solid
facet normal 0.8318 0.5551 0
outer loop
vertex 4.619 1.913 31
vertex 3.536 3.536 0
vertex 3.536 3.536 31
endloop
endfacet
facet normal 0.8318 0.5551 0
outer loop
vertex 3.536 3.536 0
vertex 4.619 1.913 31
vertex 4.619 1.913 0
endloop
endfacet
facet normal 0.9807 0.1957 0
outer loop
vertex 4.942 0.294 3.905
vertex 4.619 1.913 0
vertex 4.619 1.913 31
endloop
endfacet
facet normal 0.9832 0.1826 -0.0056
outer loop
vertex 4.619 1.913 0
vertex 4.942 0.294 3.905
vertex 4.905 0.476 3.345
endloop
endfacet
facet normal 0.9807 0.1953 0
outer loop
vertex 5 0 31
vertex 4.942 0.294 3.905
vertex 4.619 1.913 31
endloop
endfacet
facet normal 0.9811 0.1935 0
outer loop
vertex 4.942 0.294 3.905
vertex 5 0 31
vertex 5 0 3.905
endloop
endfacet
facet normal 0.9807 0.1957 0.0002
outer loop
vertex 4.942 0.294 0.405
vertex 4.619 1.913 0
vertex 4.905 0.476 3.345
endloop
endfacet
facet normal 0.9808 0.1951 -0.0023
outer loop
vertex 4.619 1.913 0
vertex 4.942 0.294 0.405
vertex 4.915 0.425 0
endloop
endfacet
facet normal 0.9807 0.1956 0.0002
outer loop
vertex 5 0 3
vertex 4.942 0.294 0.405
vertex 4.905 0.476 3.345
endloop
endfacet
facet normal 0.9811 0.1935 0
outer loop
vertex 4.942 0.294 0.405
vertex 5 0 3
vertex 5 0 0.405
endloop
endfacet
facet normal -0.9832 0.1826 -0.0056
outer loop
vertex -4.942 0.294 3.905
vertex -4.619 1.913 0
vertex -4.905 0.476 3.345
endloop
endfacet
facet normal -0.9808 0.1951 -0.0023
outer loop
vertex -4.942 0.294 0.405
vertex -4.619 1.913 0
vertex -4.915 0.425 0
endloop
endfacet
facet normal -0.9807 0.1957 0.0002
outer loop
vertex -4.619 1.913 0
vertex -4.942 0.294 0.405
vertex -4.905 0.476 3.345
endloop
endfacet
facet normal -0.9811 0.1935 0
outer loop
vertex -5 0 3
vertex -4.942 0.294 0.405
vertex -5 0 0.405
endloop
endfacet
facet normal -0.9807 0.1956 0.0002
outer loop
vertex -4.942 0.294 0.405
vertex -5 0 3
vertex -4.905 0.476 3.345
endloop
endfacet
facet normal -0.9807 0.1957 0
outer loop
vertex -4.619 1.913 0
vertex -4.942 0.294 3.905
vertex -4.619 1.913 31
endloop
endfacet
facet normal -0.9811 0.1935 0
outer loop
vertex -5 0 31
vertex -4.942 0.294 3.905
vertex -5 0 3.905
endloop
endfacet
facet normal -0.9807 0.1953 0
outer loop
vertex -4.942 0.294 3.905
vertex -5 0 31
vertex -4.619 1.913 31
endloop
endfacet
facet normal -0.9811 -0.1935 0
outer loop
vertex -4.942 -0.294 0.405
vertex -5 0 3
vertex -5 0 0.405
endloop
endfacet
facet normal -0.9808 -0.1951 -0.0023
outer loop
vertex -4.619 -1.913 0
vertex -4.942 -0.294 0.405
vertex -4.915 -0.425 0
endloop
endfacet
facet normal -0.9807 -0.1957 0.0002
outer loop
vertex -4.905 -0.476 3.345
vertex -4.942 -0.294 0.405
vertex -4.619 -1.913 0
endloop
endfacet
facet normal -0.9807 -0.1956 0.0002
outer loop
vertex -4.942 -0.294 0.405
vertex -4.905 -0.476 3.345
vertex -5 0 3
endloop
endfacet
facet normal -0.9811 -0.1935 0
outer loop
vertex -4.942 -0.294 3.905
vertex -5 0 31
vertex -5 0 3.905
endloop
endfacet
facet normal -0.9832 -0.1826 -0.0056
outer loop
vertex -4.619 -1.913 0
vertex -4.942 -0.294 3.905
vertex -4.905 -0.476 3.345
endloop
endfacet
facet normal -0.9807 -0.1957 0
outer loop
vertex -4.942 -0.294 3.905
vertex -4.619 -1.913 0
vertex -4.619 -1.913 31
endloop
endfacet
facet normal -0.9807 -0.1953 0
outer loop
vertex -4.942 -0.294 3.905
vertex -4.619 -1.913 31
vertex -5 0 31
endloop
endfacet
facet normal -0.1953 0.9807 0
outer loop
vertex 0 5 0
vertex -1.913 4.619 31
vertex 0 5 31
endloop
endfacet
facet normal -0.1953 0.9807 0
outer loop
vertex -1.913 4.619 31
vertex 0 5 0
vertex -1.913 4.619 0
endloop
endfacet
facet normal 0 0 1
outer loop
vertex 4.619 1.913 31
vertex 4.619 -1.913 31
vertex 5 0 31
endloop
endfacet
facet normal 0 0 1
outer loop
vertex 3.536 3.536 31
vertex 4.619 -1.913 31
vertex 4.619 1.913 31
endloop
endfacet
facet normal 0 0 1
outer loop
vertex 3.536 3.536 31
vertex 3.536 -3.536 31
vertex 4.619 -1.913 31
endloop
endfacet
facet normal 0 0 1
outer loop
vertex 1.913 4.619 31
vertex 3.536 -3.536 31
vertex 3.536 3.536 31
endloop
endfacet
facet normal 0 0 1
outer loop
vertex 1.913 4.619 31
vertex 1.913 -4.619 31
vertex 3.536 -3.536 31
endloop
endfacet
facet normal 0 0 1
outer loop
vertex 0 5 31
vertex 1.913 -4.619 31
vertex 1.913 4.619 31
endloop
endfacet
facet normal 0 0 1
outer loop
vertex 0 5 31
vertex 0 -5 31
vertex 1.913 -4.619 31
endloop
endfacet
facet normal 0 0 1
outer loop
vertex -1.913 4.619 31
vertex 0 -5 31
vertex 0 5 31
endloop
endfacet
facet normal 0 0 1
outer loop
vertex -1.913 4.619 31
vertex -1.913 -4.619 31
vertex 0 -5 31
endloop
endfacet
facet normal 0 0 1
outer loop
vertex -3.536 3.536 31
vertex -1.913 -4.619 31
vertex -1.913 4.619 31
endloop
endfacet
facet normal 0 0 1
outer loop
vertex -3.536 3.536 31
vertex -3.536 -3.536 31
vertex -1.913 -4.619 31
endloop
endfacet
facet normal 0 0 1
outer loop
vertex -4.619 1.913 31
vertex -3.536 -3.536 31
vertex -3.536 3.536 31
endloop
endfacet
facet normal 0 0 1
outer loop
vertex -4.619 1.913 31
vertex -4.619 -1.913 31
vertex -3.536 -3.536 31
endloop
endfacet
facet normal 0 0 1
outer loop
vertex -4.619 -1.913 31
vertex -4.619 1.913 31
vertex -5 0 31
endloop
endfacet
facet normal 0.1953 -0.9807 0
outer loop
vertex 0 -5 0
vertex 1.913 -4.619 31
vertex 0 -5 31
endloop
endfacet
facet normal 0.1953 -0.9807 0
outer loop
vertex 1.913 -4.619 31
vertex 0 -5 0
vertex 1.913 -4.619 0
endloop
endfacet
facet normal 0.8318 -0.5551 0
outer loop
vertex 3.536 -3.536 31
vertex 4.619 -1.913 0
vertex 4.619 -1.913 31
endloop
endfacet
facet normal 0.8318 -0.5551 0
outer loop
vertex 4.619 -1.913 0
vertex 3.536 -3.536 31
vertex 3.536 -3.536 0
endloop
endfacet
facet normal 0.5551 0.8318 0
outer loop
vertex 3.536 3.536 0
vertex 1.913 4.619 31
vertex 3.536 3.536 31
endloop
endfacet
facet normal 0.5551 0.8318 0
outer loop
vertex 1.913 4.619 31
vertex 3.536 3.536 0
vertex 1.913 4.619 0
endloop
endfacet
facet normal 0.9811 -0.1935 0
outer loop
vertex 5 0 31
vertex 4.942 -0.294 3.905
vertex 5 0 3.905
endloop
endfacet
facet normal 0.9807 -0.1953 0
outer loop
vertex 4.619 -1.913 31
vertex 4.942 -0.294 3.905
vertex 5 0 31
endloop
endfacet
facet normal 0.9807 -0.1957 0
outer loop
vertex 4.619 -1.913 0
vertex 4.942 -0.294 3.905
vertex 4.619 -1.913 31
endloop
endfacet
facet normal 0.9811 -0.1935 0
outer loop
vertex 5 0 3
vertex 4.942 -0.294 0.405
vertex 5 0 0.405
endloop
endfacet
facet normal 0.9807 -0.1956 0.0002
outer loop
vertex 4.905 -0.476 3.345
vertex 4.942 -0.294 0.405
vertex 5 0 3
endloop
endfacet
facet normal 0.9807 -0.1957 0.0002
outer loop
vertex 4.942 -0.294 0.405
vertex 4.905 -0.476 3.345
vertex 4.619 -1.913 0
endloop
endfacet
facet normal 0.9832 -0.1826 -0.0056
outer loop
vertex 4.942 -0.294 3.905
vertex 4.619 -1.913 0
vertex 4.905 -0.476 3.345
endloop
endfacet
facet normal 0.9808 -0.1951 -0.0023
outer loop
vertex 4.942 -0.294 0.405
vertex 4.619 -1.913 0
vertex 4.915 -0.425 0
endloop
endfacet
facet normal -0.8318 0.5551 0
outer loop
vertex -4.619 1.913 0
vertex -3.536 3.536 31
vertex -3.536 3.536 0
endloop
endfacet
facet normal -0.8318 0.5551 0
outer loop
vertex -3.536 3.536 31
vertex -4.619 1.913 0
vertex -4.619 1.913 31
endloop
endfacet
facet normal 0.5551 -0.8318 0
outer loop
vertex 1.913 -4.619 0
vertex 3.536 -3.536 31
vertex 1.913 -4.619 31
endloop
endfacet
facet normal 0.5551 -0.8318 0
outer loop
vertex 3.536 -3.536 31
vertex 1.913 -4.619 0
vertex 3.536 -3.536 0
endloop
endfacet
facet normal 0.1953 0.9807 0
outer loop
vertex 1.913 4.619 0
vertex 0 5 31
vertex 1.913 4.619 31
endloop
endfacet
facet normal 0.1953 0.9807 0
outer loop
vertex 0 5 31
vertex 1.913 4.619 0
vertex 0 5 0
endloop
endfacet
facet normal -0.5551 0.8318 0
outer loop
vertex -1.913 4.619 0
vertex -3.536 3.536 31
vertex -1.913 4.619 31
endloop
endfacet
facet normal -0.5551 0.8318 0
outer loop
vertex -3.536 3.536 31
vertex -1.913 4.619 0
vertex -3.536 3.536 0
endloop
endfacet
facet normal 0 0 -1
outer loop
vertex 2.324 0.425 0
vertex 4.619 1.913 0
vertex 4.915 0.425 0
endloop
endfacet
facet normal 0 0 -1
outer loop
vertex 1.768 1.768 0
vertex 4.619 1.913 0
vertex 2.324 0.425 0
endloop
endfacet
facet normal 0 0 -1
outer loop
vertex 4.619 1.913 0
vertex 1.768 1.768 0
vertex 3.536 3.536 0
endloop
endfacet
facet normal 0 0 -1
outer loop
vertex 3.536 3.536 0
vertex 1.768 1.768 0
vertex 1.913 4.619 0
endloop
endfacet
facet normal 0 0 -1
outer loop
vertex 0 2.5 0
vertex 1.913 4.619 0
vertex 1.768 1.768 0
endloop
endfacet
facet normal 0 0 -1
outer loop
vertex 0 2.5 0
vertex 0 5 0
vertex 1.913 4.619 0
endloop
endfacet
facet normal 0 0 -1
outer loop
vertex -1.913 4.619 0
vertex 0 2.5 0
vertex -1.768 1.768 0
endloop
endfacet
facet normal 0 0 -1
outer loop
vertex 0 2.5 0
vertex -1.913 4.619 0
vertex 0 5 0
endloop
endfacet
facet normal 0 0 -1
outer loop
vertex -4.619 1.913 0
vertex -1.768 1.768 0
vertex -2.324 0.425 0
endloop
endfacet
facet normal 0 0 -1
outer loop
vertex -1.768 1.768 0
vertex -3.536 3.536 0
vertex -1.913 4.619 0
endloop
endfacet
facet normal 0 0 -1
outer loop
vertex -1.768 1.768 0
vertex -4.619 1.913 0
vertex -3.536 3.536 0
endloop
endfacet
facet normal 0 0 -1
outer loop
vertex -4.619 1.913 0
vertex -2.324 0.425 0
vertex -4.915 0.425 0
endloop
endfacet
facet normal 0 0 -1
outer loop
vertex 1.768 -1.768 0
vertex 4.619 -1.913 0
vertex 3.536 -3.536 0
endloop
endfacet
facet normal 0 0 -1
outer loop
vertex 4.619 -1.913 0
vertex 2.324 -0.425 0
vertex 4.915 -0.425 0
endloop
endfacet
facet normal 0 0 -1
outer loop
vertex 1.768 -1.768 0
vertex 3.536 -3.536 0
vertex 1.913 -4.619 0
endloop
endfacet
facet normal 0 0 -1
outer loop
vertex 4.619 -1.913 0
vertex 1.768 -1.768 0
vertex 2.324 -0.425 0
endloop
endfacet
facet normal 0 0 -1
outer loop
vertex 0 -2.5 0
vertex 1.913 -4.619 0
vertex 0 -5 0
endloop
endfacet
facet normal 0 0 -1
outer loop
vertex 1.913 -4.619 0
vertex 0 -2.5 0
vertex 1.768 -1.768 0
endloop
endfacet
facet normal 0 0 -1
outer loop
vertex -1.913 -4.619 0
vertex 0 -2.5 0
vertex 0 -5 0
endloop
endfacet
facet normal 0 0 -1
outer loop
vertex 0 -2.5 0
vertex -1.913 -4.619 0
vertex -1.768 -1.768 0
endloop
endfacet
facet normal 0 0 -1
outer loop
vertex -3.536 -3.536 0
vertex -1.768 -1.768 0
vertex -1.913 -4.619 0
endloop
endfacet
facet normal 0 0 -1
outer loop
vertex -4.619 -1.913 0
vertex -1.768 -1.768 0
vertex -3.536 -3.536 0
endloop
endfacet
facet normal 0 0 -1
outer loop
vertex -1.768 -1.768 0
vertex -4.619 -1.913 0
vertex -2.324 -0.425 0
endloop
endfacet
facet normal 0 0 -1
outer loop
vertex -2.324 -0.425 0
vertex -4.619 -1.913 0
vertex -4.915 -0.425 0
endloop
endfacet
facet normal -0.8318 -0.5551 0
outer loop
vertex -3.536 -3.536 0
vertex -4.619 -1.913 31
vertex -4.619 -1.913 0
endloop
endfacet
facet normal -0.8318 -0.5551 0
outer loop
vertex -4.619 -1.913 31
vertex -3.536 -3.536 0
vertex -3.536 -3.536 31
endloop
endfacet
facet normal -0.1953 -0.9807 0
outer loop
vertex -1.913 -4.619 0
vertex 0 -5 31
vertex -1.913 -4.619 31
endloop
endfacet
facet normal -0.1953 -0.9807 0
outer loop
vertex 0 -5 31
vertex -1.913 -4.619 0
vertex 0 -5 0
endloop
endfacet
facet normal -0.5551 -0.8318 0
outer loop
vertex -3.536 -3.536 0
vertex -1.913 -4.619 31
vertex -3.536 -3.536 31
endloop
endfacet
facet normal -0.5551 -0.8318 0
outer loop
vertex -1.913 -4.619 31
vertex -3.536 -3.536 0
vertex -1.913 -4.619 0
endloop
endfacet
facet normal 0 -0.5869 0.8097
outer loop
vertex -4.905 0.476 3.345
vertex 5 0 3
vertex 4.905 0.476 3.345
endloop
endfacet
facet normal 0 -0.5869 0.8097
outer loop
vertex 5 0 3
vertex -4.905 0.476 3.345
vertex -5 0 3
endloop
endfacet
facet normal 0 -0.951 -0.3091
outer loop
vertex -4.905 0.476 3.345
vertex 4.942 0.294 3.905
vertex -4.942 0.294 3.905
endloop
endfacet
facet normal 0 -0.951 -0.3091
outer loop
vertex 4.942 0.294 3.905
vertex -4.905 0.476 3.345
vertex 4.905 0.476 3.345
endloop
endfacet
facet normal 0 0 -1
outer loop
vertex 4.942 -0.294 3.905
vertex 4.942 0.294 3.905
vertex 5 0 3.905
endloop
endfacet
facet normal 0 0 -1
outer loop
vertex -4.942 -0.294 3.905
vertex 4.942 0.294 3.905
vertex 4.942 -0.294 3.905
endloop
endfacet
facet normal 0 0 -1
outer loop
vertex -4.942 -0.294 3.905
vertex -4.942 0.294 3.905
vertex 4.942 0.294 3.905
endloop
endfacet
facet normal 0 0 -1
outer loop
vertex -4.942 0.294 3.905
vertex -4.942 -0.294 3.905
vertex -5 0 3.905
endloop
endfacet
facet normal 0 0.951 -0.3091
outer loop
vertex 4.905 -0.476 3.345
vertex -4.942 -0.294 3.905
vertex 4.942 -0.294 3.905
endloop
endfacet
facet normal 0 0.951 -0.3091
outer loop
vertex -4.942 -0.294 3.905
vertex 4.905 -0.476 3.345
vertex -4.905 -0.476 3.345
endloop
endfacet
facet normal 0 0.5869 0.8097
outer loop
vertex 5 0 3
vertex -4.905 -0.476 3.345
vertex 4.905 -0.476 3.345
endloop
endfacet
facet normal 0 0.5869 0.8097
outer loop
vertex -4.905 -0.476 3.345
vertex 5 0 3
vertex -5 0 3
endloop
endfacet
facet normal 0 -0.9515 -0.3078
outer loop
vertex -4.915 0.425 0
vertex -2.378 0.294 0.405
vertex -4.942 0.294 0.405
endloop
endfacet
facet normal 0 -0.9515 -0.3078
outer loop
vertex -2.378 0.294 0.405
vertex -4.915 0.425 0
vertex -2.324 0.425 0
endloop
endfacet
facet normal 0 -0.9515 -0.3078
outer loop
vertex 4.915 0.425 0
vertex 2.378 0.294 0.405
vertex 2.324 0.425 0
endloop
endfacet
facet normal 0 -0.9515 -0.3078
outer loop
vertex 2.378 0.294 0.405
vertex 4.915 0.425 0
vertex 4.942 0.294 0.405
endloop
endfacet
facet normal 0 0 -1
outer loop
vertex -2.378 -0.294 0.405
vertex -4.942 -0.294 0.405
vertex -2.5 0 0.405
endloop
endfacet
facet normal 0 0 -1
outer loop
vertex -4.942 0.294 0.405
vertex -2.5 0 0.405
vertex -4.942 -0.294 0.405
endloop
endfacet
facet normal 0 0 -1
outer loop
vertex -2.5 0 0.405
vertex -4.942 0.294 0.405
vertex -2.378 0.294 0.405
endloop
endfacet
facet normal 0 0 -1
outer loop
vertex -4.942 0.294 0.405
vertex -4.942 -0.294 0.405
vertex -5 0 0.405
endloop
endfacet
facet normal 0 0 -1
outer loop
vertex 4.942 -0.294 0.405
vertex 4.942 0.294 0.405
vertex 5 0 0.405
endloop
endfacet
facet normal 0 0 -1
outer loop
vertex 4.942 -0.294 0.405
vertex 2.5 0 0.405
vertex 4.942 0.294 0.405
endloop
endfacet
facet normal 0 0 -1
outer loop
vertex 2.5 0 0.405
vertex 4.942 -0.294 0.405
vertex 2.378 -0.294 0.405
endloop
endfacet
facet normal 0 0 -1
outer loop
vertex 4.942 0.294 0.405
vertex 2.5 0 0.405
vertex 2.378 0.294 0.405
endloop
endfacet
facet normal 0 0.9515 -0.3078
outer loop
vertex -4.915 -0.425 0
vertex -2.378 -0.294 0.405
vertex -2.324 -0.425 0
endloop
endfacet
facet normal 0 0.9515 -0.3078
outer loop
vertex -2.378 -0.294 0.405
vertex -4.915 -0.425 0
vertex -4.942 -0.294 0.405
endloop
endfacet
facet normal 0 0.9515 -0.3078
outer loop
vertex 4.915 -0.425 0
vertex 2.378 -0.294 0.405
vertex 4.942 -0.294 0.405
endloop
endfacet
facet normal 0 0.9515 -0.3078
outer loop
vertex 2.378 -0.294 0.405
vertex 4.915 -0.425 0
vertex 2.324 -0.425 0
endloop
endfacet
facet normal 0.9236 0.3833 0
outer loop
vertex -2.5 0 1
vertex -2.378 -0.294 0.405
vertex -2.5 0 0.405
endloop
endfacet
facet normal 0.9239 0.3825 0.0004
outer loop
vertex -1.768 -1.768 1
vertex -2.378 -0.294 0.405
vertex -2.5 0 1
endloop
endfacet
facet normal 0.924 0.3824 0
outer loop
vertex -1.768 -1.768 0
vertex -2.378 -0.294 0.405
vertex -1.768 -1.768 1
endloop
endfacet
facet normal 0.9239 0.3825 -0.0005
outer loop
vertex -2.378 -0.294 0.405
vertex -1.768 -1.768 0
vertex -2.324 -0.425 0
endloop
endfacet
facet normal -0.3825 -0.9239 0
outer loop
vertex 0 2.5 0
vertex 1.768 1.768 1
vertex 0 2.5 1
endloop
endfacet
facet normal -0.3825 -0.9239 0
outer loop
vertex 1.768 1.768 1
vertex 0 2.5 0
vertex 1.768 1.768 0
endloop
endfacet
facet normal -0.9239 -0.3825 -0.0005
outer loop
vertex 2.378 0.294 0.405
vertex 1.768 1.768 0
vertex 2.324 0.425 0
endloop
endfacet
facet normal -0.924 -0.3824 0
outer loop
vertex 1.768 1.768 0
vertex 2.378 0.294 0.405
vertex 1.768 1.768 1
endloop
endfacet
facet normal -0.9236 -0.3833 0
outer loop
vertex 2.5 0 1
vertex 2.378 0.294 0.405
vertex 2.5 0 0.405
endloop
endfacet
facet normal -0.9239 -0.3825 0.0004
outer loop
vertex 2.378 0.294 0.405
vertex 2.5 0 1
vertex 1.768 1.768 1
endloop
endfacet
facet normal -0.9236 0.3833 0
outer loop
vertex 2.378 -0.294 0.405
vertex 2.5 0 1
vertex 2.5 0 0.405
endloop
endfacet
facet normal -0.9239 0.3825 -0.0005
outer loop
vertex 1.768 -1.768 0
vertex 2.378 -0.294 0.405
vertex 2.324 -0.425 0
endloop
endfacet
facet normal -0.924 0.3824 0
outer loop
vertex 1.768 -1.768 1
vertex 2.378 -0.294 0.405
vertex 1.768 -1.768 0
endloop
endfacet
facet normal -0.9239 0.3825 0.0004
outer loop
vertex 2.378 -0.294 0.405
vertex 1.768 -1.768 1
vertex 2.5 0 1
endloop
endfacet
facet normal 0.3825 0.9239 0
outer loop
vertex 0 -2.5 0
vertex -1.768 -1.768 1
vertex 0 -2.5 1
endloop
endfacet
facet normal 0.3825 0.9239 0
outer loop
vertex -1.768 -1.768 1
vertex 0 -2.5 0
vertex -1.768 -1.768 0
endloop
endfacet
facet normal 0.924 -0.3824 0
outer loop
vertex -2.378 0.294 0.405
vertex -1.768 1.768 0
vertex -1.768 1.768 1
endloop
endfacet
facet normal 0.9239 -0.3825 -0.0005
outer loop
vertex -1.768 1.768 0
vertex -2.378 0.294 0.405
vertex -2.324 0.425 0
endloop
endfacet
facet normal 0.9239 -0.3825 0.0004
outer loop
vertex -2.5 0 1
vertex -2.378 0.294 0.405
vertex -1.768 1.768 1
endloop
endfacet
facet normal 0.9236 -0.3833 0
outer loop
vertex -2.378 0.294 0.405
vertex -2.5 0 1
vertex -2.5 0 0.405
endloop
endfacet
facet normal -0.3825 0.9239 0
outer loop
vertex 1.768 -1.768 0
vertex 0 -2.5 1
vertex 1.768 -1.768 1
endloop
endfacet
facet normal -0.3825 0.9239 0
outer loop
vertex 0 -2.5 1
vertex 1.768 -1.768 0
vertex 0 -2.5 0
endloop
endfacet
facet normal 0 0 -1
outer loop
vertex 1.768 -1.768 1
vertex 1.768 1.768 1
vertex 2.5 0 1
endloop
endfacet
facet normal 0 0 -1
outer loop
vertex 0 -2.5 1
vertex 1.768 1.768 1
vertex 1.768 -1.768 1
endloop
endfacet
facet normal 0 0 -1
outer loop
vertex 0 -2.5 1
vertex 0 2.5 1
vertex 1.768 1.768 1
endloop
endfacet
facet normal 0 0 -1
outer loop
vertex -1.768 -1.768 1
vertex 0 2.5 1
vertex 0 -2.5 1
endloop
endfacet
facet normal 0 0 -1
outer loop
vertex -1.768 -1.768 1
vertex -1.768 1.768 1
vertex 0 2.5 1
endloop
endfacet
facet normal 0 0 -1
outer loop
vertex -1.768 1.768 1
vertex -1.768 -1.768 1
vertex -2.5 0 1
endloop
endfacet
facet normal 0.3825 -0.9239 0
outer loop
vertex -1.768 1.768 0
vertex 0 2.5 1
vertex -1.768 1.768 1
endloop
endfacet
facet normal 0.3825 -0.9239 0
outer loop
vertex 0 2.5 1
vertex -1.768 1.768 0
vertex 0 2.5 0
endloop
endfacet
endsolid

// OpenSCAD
// file: dimensions.scad
//------------------------------------------------------------------------------
// Cargo holder - dimensions
//
// This file contains the dimensions for the cargo holder mechanism.
//
// This model is part of the AutonomousDroneDeliverySystem:
// https://github.com/Andreas-Menzel/AutonomousDroneDeliverySystem
//------------------------------------------------------------------------------
// @author: Andreas Menzel
// @copyright: Copyright (c) 2022 Andreas Menzel
//------------------------------------------------------------------------------

// Notes:
// - width, length and height are always in relation to the drone, unless
//   explicitly stated otherwise

//////////////////////////////// Contact Plate /////////////////////////////////
// The contact plates of the container- and drone- part touch. They have the
// same size. TODO: Use magnets to help with the alignment of the parts?
contact_plate_width = 150;
contact_plate_length = 150;
contact_plate_wall_thickness = 2;

//////////////////////////////// Alignment Pin /////////////////////////////////
// Pins used to align the cargo container relative to the drone. This mechanism
// can (only) correct small misalignments.

// Offset from the contact plate sides
alignment_pin_offset = 5;
// Clearance (on all sides) to allow for slightly misaligned drone / cargo
// container
alignment_pin_align_clearance = 7;

alignment_pin_width_base = contact_plate_width - 2*alignment_pin_offset;
alignment_pin_length_base = 17;

alignment_pin_width_top = alignment_pin_width_base - 2*alignment_pin_align_clearance;
alignment_pin_length_top = alignment_pin_length_base - 2*alignment_pin_align_clearance;

alignment_pin_height = 20;

alignment_pin_slot_wall_thickness = 2;
// The wall thickness of the alignment pin slot measured in XY-plane. The
// The wall thickness is slightly smaller. TODO: calculate correctly.
alignment_pin_slot_plane_wall_thickness = 2.5;

// Half of the clearance will be added to each part (container / drone)
alignment_pin_clearance = 0.25;

// Center cutout of the alignment pin. For weight reduction.
alignment_pin_center_cutout_width = contact_plate_width - 2*alignment_pin_offset - (alignment_pin_width_base - alignment_pin_width_top) - 2*20;

////////////////////////////// Locking Mechanism ///////////////////////////////
locking_mechanism_pin_wire_diamter = 1;
locking_mechanism_pin_connection_length = 7;
locking_mechanism_pin_diameter = 10;
locking_mechanism_pin_clearance_lock = 0.5;
locking_mechanism_pin_clearance_key = 2;

locking_mechanism_lock_key_clearance = 2*alignment_pin_align_clearance;

// The key part is located on the container
locking_mechanism_key_thickness = 4;
locking_mechanism_key_pin_outline = 4; // Wall thickness around the hole of the
                                       // locking pin.

// The lock part is located on the drone
locking_mechanism_lock_offset = alignment_pin_offset;
locking_mechanism_lock_wall_thickness = 3;
locking_mechanism_lock_rest_length = locking_mechanism_lock_key_clearance + locking_mechanism_key_thickness;
locking_mechanism_lock_rest_wall_thickness = 2;

///////////////////////////////// Servo Mount //////////////////////////////////
servo_slot_wall_thickness = 2;
servo_slot_height = 10;

servo_mount_width = 5;
servo_mount_thickness = 7;
servo_mount_screw_slot_width = 0.75;

servo_assembly_thickness = 5;

// The width OF THE SERVO - smaller side of the servo; not in relation to the
// drone
servo_body_width = 12;
// The length OF THE SERVO - larger side of the servo; not in relation to the
// drone
servo_body_length = 23;
servo_center_offset = 6;
servo_height_offset = 11;

// Wall thickness of the slot on the drone part in which the servo mount will be
// glued to.
servo_mount_drone_part_wall_thickness = 3;
// main file
//------------------------------------------------------------------------------
// Cargo holder - locking pin
//
// This model contains the pin to lock the container to the drone.
//
// This model is part of the AutonomousDroneDeliverySystem:
// https://github.com/Andreas-Menzel/AutonomousDroneDeliverySystem
//------------------------------------------------------------------------------
// @author: Andreas Menzel
// @copyright: Copyright (c) 2022 Andreas Menzel
//------------------------------------------------------------------------------


include <dimensions.scad>


module locking_pin() {
    // Short versions of the variables needed
    pin_diameter = locking_mechanism_pin_diameter;
    lock_wall_thickness = locking_mechanism_lock_wall_thickness;
    key_thickness = locking_mechanism_key_thickness;
    lock_key_clearance = locking_mechanism_lock_key_clearance;

    slide_length = 2*lock_wall_thickness + key_thickness + lock_key_clearance;

    wire_diameter = locking_mechanism_pin_wire_diamter;
    connection_length = locking_mechanism_pin_connection_length;
    

    difference() {
        // Main pin
        cylinder(d=pin_diameter, h=slide_length + connection_length);

        translate([-pin_diameter / 2, 0, connection_length / 2])
            rotate([0, 90, 0])
            cylinder(d=wire_diameter, h=pin_diameter);
        translate([-pin_diameter / 2, 0, 0])
            rotate([0, 90, 0])
            cylinder(d=wire_diameter, h=pin_diameter);
        
        cylinder(d=pin_diameter / 2 ,h=wire_diameter);
    }
}


// When executing the `export.sh` script, this variable will autimatically be
// set to true. The default value should be false.
export = true;
if(export) {
    locking_pin();
}
